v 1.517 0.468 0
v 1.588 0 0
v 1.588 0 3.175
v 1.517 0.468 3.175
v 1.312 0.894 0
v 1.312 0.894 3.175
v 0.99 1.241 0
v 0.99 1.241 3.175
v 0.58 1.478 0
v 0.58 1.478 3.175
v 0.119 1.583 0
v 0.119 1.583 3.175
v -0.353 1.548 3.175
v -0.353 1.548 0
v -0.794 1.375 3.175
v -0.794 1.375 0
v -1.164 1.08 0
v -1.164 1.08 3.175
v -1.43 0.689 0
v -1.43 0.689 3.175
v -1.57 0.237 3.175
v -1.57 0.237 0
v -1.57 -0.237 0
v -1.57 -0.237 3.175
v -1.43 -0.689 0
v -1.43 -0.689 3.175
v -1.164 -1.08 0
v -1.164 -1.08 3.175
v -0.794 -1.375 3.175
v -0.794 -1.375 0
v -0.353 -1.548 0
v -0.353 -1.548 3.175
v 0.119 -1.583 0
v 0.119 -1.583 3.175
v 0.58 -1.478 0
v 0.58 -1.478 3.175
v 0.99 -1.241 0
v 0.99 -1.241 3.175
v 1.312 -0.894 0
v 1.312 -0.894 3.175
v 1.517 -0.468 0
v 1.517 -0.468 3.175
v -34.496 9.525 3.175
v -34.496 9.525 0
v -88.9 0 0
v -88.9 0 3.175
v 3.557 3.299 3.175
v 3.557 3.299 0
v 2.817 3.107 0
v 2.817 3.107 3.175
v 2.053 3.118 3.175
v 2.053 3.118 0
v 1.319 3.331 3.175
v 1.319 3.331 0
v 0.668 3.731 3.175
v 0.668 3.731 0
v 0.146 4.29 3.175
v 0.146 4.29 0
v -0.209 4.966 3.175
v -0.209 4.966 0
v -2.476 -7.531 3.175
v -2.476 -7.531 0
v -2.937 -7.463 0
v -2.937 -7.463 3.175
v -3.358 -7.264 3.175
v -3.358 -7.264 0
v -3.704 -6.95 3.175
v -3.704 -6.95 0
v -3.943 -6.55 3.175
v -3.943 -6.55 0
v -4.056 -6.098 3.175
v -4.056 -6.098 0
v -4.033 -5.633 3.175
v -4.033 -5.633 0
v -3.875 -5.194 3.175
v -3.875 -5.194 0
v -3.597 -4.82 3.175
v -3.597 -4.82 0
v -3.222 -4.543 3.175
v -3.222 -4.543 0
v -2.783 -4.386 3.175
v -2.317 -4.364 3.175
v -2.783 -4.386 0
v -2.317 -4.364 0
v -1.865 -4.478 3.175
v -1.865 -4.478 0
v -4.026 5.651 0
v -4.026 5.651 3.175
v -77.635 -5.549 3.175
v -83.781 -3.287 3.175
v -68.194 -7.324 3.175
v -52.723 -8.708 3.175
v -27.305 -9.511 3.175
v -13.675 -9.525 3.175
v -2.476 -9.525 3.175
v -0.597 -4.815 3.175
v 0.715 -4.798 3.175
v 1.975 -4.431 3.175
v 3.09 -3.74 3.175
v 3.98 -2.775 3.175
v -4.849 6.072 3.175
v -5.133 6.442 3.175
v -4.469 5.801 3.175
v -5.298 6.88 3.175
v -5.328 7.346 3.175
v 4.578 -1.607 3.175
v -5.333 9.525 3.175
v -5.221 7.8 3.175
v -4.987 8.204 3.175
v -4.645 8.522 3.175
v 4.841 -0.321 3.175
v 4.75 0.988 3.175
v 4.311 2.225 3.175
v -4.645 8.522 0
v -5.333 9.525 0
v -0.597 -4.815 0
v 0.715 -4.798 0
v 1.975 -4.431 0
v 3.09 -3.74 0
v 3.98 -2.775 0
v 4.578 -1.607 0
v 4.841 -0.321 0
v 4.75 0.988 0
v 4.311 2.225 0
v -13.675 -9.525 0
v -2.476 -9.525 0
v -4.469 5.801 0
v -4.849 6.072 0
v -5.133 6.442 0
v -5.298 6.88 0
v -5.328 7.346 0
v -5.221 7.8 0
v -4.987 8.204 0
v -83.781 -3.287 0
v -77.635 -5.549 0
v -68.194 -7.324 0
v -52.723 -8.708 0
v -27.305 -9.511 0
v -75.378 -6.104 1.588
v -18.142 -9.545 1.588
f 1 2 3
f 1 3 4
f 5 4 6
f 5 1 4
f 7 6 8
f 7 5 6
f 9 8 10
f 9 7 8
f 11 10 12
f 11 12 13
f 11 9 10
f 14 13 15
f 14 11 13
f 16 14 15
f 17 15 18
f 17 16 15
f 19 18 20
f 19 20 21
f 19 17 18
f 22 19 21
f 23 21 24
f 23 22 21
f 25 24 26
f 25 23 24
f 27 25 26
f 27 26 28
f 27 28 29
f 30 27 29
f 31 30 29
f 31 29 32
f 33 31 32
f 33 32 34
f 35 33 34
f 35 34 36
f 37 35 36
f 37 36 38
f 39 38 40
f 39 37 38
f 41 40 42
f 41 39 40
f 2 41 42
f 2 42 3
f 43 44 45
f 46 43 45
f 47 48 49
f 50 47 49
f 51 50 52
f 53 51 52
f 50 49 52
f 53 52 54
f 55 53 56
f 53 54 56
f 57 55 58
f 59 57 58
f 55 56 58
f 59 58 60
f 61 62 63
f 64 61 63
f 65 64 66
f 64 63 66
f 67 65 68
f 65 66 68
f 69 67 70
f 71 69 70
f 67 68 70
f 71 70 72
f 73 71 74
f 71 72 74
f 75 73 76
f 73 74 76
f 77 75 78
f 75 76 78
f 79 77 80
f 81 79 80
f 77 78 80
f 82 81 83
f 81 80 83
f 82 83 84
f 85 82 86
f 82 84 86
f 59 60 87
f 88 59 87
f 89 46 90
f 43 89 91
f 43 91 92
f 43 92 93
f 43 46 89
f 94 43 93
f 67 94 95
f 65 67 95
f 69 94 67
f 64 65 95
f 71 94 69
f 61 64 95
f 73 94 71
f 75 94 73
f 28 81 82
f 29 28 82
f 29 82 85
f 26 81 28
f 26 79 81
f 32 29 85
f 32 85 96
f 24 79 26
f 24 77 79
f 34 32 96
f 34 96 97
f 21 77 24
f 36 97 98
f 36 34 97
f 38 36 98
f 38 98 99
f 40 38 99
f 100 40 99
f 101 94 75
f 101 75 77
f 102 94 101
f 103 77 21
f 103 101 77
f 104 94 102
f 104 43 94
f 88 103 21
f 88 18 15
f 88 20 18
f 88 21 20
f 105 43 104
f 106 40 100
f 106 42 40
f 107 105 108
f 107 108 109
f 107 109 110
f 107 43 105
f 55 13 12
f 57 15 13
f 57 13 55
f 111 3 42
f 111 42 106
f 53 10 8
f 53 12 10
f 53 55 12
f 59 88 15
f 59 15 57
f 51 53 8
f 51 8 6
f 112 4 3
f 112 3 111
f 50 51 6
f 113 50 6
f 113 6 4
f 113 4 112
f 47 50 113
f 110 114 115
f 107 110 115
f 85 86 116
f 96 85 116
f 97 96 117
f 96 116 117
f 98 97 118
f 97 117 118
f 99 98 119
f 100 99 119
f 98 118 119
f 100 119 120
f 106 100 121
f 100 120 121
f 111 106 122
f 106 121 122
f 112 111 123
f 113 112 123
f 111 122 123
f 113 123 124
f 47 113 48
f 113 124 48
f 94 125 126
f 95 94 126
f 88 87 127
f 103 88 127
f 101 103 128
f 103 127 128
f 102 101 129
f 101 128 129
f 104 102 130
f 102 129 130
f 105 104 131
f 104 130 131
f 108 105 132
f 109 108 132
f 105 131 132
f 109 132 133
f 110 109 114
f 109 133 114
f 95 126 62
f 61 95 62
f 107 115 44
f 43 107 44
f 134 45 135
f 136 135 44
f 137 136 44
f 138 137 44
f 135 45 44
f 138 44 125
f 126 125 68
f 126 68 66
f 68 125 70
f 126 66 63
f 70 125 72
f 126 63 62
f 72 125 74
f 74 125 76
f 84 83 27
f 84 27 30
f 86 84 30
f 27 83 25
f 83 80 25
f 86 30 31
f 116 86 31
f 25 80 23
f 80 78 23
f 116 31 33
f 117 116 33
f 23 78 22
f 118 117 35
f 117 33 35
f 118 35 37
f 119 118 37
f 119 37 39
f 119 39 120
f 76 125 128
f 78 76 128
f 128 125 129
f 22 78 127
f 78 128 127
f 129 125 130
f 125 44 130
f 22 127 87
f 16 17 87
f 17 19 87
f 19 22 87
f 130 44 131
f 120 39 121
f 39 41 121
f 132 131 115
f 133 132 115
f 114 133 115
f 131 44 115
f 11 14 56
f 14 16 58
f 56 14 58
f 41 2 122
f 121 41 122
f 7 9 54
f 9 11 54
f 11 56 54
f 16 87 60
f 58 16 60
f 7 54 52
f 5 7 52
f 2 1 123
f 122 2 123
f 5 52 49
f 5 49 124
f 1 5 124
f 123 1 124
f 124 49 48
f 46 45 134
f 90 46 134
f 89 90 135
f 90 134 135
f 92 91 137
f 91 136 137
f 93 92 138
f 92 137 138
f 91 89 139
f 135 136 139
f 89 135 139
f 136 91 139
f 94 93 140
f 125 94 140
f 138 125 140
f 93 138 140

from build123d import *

# Parameters (mm, degrees)
F1_R     = 1.5875
F2_DEPTH = 3.175


with BuildPart() as f2:
    # F1 (on Top) → F2 (new body)
    with BuildSketch(Plane.XY):
        with BuildLine():
            ThreePointArc((-4.0262265136, 5.6513251328), (-5.2977559244, 6.8795791134), (-4.6446774192, 8.5224069649))
            Line((-4.6446774192, 8.5224069649), (-5.3333519733, 9.525))
            Line((-5.3333519733, 9.525), (-34.4962663949, 9.525))
            Line((-34.4962663949, 9.525), (-88.9, 0))
            add(Edge.make_bspline(
                [(-88.9, 0), (-87.2379108001, -1.1763368423), (-77.6465036689, -10.294371312), (-16.7160528872, -9.525), (-13.6749316007, -9.525)],
                knots=[0, 0, 0, 0, 0.3288466474, 1, 1, 1, 1], degree=3))
            Line((-13.6749316007, -9.525), (-2.4758519733, -9.525))
            Line((-2.4758519733, -9.525), (-2.4758519733, -7.5313699697))
            ThreePointArc((-2.4758519733, -7.5313699697), (-4.0325407656, -5.6326204651), (-1.8654348201, -4.4784187937))
            ThreePointArc((-1.8654348201, -4.4784187937), (3.9795795285, -2.7747123701), (3.5571823428, 3.2988688577))
            ThreePointArc((3.5571823428, 3.2988688577), (1.31903069, 3.3310035803), (-0.2092779199, 4.9664326537))
            Line((-0.2092779199, 4.9664326537), (-4.0262265136, 5.6513251328))
        make_face()
        Circle(F1_R, mode=Mode.SUBTRACT)
    extrude(amount=F2_DEPTH)


solid = f2.part
